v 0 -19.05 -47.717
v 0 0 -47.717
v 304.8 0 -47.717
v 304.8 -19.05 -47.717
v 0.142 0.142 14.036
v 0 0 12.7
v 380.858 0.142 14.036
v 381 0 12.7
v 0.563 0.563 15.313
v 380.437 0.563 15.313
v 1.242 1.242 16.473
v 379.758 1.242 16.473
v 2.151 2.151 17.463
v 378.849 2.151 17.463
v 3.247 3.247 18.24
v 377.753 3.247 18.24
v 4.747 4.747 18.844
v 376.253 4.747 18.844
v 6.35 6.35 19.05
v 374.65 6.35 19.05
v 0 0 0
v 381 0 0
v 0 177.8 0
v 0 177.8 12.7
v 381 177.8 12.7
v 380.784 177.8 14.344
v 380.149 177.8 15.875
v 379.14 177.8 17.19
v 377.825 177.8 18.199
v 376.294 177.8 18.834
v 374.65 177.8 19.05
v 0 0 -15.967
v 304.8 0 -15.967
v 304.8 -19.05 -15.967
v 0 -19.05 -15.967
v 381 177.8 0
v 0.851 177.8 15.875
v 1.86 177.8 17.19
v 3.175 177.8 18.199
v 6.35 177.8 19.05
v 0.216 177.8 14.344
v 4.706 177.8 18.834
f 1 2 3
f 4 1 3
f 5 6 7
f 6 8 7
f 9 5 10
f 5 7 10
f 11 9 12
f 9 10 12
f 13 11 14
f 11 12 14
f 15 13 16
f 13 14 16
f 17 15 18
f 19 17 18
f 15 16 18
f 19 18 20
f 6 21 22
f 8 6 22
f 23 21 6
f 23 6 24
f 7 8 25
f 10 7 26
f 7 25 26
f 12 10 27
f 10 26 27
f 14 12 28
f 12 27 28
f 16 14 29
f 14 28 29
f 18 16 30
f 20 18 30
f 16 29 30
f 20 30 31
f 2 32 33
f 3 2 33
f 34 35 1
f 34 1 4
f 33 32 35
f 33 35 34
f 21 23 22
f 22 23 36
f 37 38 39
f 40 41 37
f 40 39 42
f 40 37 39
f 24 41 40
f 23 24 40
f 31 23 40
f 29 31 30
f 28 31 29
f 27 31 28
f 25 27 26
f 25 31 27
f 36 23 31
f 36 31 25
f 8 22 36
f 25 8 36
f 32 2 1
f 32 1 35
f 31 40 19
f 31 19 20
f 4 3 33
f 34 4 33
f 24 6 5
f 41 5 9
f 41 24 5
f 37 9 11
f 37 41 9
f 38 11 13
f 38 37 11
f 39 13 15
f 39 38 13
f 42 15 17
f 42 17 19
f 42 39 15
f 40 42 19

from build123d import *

# Parameters (mm, degrees)
F0_W     = 381
F0_H     = 177.8
F1_DEPTH = 19.05
F2_R     = 6.35
F3_W     = 304.8
F3_H     = 31.75
F4_DEPTH = 19.05


with BuildPart() as f1:
    # F0 (on Top) → F1 (new body)
    with BuildSketch(Plane.XY):
        with Locations((190.5, 88.9)):
            Rectangle(F0_W, F0_H)
    extrude(amount=F1_DEPTH)

    # F2
    f2_edges = [f1.edges().sort_by_distance(p)[0] for p in [
        (0, 88.9, 19.05),
        (190.5, 0, 19.05),
        (381, 88.9, 19.05),
    ]]
    fillet(f2_edges, radius=F2_R)


with BuildPart() as f4:
    # F3 (on Front) → F4 (new body)
    with BuildSketch(Plane.XZ):
        with Locations((152.4, -31.841967)):
            Rectangle(F3_W, F3_H)
    extrude(amount=F4_DEPTH)


solid = Compound([f1.part, f4.part])
